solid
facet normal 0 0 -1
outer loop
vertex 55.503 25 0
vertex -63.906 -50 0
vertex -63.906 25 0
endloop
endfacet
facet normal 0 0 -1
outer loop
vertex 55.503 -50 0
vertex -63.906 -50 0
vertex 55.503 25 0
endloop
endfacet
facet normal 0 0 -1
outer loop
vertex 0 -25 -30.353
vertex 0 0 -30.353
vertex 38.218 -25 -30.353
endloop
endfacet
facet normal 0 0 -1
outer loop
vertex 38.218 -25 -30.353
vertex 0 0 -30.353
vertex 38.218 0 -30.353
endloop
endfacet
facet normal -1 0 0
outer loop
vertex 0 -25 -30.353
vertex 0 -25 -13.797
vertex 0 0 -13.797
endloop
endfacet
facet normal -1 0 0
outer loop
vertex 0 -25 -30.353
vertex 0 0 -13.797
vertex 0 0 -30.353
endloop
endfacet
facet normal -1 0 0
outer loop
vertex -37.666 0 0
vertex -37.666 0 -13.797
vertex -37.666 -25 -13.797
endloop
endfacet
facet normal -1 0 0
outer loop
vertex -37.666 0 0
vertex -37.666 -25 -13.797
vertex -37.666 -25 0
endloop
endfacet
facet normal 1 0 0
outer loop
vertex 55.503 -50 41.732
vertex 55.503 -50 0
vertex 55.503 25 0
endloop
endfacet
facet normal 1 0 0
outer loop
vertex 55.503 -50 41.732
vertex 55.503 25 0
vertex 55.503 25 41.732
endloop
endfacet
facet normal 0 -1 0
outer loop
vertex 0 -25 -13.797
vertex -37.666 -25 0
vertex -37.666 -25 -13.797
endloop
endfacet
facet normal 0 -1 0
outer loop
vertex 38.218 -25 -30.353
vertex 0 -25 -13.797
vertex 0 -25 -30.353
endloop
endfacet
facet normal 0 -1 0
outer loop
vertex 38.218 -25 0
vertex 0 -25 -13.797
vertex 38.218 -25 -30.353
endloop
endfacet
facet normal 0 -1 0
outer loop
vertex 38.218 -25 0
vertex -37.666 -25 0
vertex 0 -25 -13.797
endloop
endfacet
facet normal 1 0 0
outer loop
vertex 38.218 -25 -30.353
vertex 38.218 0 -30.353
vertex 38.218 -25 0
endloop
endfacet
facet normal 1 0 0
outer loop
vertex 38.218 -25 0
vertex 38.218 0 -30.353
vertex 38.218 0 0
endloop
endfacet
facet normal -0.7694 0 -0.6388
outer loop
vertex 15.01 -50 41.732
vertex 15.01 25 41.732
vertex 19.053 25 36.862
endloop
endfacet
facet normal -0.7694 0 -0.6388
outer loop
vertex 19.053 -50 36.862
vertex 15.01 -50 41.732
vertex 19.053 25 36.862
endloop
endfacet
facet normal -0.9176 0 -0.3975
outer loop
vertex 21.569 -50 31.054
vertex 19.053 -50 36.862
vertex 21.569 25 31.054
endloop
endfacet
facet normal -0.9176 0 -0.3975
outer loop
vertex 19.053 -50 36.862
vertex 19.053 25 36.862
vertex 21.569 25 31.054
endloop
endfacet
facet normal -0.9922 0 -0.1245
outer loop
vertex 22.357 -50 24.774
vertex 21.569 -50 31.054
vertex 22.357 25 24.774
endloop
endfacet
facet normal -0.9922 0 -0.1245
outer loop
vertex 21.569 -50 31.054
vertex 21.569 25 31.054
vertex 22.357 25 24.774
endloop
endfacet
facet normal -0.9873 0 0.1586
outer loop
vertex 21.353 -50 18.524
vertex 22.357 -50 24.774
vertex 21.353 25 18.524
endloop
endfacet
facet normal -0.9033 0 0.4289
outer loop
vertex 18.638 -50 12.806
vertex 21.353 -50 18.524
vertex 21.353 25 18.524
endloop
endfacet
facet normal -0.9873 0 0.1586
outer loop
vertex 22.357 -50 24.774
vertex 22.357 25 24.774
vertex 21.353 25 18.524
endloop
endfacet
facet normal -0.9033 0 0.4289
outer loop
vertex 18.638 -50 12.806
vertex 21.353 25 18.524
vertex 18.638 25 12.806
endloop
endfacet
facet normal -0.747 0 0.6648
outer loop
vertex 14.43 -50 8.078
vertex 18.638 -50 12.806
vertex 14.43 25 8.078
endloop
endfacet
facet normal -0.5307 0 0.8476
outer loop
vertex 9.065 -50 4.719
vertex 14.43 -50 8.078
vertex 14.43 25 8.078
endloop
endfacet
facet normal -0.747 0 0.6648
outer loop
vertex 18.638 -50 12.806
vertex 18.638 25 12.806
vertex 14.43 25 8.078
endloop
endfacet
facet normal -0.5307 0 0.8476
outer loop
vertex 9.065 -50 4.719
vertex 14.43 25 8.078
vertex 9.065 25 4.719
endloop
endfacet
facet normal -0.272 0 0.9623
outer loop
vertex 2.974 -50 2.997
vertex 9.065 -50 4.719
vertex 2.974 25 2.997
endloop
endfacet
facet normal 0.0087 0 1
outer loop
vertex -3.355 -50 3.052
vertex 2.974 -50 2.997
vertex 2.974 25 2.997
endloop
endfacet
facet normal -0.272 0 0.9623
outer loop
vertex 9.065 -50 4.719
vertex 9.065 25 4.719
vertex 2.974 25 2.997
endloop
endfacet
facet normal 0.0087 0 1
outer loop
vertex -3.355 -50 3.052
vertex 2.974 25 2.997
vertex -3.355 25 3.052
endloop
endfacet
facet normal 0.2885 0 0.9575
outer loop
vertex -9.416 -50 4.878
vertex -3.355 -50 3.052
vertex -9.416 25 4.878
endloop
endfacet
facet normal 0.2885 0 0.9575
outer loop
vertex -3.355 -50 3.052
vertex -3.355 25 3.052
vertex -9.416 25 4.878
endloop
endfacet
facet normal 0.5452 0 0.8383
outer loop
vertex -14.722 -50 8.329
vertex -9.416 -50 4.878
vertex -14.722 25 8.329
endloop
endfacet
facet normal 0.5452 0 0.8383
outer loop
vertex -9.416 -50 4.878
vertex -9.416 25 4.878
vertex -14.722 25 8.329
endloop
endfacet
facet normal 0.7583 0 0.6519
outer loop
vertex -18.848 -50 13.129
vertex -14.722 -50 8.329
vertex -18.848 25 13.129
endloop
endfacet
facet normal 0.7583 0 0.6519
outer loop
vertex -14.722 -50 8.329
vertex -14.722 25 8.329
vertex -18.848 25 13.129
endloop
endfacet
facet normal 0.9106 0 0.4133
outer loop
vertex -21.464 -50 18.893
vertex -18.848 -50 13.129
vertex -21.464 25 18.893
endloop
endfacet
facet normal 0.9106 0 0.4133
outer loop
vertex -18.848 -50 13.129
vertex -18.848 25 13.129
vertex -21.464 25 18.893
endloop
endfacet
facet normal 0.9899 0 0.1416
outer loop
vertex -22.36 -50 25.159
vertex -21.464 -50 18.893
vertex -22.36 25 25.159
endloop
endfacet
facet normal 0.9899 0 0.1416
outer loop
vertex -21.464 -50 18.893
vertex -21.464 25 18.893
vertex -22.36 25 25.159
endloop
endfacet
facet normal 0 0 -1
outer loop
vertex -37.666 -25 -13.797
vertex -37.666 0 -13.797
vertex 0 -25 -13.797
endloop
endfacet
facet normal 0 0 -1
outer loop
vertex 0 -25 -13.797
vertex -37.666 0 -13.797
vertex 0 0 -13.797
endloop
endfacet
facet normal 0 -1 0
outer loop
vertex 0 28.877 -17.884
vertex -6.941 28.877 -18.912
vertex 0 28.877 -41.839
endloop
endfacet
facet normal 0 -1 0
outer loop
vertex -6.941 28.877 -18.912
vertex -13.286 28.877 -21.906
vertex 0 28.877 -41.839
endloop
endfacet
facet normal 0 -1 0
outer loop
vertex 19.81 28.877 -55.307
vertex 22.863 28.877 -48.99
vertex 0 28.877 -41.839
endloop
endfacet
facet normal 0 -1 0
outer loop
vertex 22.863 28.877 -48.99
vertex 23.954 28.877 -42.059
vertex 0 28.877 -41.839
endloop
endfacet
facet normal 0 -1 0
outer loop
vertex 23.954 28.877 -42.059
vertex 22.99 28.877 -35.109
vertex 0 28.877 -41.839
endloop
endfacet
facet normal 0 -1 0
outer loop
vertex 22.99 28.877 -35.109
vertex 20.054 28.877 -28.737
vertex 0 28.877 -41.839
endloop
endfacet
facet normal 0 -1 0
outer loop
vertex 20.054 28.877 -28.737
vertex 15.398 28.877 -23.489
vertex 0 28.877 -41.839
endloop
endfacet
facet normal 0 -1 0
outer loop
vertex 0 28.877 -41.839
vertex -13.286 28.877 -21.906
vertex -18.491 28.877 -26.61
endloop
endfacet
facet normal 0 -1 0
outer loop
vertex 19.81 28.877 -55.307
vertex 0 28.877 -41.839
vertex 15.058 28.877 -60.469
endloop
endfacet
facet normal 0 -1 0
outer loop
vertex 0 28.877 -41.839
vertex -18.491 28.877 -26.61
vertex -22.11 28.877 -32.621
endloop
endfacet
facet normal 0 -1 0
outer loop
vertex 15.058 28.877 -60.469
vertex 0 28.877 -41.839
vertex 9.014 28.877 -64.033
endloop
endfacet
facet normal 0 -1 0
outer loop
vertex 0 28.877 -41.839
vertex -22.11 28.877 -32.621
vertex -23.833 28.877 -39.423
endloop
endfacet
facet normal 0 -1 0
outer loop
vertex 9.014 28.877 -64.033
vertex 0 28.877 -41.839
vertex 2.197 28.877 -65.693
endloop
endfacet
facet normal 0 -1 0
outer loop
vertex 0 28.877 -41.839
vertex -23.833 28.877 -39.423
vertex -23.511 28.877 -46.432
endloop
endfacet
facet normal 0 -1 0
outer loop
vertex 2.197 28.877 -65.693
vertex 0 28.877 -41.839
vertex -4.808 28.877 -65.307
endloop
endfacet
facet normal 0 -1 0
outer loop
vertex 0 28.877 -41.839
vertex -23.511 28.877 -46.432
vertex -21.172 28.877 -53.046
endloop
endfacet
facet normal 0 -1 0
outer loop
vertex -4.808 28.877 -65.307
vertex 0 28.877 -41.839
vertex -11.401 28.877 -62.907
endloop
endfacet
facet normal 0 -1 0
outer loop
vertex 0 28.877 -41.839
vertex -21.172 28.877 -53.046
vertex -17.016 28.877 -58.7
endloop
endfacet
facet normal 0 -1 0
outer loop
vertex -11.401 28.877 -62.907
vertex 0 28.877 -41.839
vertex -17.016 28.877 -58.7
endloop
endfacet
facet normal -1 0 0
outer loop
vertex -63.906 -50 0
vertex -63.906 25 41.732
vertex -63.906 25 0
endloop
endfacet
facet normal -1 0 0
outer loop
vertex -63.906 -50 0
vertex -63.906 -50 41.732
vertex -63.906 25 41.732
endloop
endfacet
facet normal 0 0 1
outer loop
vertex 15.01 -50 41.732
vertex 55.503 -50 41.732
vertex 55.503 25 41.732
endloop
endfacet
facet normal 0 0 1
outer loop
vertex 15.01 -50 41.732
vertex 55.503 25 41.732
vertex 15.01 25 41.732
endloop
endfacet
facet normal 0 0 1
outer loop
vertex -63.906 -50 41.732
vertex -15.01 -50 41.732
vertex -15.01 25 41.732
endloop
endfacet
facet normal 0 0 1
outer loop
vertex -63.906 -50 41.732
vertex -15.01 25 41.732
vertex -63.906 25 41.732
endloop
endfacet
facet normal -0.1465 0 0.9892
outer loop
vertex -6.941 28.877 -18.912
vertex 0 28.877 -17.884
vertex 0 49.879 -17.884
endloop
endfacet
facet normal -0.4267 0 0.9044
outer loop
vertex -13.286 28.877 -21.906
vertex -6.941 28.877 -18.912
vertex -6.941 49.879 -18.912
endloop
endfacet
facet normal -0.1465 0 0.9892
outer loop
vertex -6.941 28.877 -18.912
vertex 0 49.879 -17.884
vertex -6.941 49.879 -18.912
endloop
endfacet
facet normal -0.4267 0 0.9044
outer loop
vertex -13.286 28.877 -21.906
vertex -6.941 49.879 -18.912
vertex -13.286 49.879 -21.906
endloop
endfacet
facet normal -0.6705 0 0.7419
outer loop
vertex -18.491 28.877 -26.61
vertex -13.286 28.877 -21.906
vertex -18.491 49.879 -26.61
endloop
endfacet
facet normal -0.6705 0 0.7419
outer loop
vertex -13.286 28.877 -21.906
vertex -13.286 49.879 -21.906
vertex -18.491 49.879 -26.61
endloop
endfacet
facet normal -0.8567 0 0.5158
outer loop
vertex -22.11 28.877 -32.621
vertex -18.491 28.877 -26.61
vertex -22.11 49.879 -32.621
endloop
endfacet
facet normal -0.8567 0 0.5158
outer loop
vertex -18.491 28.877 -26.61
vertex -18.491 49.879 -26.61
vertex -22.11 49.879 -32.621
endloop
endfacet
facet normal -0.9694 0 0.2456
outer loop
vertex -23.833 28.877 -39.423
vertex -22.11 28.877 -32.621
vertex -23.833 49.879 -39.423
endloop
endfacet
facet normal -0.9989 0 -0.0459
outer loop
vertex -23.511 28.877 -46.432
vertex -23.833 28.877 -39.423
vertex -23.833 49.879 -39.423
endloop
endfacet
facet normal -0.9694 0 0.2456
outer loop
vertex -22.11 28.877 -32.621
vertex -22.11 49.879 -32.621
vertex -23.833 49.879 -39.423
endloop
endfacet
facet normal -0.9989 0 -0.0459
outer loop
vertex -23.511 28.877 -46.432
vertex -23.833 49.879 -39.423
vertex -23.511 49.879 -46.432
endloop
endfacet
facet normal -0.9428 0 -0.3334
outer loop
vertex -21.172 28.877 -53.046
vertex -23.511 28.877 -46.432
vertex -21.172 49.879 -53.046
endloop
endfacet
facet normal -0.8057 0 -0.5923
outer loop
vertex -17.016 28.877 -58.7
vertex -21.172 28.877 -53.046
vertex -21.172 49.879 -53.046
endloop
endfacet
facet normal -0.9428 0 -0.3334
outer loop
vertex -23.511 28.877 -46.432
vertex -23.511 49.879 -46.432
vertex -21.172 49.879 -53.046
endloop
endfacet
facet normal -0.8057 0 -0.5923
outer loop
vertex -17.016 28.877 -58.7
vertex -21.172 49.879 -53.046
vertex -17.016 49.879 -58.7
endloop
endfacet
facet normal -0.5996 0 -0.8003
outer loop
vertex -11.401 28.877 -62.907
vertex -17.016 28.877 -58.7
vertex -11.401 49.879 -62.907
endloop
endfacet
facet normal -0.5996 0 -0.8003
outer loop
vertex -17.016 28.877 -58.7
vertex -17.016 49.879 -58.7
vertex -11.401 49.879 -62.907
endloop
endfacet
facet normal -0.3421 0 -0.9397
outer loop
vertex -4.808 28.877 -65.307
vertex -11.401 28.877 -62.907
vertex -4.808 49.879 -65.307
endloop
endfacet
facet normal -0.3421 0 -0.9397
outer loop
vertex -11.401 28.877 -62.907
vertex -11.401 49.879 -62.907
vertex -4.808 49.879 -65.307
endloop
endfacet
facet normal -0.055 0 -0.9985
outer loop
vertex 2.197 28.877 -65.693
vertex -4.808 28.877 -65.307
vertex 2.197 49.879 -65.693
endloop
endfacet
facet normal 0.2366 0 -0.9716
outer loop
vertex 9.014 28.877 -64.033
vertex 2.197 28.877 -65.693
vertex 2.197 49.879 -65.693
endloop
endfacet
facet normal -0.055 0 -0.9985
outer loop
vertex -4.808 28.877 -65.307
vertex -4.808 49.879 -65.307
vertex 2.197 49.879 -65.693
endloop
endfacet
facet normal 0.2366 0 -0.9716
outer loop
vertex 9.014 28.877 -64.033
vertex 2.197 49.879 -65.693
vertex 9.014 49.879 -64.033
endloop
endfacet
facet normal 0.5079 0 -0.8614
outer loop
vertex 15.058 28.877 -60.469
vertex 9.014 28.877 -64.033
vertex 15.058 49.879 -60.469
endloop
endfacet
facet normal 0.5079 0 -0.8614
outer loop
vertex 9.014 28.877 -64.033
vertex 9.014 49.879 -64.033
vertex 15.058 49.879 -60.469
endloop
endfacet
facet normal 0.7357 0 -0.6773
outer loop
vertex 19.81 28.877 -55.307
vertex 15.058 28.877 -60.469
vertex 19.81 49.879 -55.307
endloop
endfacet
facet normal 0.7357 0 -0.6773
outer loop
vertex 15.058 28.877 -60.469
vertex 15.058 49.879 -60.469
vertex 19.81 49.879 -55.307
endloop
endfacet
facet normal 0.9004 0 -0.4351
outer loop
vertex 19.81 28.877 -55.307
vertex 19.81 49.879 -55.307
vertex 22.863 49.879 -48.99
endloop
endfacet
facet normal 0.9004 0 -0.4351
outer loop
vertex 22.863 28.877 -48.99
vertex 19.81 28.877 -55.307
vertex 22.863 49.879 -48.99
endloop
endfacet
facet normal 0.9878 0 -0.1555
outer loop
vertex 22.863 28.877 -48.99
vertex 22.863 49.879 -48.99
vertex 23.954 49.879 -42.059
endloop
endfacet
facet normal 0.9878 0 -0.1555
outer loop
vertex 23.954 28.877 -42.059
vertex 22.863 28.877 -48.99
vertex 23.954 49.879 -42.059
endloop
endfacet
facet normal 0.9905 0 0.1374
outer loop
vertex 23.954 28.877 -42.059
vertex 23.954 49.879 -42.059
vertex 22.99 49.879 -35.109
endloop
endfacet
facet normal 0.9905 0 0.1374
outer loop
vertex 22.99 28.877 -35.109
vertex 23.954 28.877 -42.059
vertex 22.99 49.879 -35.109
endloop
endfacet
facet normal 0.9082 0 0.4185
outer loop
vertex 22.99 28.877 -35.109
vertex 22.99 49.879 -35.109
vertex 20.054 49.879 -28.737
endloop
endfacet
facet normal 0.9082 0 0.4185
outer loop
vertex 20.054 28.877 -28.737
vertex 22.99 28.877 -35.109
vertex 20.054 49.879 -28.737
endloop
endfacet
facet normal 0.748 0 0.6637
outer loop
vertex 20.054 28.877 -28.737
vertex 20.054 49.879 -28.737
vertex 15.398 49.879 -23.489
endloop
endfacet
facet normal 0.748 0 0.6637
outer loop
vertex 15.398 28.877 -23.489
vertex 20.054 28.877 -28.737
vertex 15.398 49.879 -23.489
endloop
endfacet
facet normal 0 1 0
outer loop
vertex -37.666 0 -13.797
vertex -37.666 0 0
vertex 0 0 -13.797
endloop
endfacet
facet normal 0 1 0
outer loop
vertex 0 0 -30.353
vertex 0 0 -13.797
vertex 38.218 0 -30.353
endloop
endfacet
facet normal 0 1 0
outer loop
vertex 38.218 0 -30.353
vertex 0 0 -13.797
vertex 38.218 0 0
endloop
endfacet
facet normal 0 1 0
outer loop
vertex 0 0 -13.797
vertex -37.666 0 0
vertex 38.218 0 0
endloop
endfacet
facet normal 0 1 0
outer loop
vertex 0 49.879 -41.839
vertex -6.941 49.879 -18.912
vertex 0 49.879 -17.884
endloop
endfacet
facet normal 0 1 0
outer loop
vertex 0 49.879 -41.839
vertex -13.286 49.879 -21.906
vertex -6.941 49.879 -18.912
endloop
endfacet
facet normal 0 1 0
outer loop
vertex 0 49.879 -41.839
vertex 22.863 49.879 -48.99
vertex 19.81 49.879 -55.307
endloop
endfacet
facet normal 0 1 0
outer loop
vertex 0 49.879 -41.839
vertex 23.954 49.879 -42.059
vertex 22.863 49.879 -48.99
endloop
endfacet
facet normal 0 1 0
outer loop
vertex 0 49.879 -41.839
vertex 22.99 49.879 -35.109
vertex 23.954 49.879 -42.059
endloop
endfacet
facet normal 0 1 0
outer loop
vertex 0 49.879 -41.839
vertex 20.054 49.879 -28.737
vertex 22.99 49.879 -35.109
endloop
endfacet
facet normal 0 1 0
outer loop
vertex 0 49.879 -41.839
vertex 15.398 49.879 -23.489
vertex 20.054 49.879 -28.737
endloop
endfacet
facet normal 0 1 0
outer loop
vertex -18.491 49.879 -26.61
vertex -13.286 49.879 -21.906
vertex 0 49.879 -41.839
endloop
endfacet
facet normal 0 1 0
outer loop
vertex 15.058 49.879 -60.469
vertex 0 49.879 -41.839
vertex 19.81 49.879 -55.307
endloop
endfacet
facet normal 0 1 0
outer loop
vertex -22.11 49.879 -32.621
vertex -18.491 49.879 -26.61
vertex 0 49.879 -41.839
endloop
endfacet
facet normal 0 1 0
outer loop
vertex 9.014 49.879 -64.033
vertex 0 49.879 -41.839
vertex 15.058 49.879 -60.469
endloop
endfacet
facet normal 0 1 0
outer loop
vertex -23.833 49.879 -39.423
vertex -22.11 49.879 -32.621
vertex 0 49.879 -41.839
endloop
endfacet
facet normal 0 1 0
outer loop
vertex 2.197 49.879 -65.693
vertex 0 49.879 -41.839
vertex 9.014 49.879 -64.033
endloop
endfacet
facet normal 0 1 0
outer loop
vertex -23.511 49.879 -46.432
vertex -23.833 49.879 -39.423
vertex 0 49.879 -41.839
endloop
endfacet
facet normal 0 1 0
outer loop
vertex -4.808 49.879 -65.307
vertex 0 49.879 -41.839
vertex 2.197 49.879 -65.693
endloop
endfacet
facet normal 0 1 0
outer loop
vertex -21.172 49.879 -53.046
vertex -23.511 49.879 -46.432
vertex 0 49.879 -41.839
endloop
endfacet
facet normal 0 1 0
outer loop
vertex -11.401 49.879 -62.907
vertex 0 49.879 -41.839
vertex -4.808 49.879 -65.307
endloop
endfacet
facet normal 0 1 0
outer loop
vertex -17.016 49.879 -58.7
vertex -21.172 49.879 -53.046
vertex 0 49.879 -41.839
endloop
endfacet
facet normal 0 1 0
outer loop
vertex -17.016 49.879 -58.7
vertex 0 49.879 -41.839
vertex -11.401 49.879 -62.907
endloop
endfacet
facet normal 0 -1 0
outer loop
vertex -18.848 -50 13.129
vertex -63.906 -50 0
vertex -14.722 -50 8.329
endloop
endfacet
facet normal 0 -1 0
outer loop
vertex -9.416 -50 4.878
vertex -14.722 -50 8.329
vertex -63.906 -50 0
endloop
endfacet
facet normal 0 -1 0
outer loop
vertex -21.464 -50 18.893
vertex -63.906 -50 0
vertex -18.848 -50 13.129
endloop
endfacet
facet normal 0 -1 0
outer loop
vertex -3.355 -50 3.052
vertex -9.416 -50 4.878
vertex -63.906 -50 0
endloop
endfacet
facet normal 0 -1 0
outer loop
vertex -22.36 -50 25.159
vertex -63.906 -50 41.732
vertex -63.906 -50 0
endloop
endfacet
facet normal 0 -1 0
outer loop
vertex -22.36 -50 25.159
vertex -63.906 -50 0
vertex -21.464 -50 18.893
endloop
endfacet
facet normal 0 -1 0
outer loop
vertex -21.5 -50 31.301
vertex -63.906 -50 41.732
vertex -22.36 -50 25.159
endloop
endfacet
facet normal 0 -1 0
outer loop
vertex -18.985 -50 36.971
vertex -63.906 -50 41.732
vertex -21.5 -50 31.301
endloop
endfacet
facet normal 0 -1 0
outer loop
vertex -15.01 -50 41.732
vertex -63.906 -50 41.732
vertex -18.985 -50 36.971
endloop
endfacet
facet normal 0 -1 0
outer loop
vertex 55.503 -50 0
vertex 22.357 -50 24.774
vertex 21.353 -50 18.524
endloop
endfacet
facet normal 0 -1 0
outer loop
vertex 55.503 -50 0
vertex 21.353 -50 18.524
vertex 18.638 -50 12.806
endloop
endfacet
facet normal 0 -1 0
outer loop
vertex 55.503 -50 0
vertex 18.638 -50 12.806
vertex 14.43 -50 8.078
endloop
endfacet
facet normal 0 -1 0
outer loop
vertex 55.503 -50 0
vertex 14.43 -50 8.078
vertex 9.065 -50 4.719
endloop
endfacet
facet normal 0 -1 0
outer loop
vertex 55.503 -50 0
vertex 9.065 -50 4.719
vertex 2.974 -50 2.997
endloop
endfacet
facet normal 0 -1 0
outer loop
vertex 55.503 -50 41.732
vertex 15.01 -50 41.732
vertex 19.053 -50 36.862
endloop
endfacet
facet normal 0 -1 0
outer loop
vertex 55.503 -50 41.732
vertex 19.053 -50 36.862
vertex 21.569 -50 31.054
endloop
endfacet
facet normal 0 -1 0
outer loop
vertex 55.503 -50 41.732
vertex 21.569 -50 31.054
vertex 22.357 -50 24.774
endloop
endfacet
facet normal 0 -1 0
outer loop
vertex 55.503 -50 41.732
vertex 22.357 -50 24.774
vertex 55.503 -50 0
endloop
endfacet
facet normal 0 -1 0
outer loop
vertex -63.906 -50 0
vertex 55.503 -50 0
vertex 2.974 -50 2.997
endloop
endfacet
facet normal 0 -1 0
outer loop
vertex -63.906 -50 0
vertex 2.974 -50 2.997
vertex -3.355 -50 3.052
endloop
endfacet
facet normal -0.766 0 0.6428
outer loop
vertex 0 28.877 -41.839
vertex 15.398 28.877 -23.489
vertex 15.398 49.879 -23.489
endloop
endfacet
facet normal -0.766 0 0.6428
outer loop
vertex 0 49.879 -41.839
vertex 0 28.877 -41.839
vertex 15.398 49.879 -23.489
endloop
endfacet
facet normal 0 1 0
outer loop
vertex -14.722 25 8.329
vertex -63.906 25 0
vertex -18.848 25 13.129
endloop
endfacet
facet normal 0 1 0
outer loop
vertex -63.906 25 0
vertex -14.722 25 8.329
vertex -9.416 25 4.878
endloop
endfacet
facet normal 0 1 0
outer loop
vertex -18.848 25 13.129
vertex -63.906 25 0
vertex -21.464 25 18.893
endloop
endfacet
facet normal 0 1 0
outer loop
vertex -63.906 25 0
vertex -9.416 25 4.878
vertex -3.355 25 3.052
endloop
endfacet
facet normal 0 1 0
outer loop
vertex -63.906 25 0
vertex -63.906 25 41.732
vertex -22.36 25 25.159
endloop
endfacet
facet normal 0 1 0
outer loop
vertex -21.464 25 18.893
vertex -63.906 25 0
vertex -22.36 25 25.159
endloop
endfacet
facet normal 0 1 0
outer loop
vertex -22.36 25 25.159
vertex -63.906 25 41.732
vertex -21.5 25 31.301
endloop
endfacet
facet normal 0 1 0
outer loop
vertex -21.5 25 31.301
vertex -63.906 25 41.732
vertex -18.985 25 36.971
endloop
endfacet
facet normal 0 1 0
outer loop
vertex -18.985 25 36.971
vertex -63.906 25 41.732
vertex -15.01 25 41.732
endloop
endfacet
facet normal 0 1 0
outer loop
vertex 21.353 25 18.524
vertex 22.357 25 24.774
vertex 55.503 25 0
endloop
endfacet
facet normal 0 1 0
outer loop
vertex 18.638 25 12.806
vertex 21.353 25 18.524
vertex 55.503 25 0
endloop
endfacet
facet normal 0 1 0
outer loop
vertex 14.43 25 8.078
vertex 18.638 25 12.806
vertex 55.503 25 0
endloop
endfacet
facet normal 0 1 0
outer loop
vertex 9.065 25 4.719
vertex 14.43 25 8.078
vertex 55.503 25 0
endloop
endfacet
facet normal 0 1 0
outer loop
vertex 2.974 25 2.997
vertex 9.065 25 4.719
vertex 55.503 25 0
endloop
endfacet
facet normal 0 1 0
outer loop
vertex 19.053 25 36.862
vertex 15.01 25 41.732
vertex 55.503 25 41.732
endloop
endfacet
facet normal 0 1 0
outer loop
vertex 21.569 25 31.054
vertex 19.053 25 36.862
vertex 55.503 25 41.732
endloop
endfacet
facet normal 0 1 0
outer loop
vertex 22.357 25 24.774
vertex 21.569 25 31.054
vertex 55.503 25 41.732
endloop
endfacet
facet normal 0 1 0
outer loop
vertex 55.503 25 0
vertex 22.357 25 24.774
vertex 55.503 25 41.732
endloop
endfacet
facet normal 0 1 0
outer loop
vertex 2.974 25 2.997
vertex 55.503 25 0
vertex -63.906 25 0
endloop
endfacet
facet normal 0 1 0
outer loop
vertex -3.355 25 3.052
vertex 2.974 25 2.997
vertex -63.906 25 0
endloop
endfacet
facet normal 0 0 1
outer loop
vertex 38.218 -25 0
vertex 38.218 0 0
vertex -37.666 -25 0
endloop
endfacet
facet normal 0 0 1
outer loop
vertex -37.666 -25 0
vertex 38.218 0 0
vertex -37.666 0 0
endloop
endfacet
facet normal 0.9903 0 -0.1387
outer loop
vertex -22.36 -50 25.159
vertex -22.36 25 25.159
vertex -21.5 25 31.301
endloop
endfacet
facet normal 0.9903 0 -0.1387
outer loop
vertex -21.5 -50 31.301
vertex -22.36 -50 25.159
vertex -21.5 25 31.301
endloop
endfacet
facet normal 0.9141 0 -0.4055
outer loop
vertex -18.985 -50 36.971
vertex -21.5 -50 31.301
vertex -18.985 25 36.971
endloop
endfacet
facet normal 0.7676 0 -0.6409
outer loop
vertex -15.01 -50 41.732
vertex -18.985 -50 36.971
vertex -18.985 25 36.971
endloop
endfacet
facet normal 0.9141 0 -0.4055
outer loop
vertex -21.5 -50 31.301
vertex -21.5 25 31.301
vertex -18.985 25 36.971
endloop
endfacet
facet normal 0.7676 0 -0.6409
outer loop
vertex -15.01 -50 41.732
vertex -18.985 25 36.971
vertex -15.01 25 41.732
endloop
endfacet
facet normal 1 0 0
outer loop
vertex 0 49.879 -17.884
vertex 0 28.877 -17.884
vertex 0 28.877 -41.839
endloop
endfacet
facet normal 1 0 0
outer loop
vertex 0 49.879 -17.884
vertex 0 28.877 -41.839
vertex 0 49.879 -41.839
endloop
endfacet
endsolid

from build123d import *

# Parameters (mm, degrees)
F2_DEPTH = 25
F1_W     = 37.6658551395
F1_H     = 13.7970196083
F3_DEPTH = 25
F4_DEPTH = 25
F6_DEPTH = 300
F7_W     = 21.0016183555
F7_H     = 23.9549651742
F8_ANGLE = 320


with BuildPart() as f2:
    # F0 (on Front) → F2 (new body)
    with BuildSketch(Plane.XZ):
        Polygon((-63.9058277011, 0), (0, 0), (55.5029883981, 0), (55.5029883981, 41.7323634028), (-63.9058277011, 41.7323634028), align=None)
    extrude(amount=F2_DEPTH)

    # F3 (add): a face of the model
    f3_faces = [f2.faces().sort_by_distance(p)[0] for p in [
        (-4.2014196515, -25, 20.8661817014),
    ]]
    extrude(f3_faces, amount=F3_DEPTH)

    # F4 (add): a face of the model
    f4_faces = [f2.faces().sort_by_distance(p)[0] for p in [
        (-4.2014196515, 0, 20.8661817014),
    ]]
    extrude(f4_faces, amount=F4_DEPTH)

    # F5 (on face) → F6 (cut)
    with BuildSketch(Plane(origin=(0, 25, 0), x_dir=(-1, 0, 0), z_dir=(0, 1, 0))):
        with BuildLine():
            Line((-15.0098233938, 41.7323634028), (15.0098233938, 41.7323634028))
            ThreePointArc((15.0098233938, 41.7323634028), (0, 47.5189849051), (-15.0098233938, 41.7323634028))
        make_face()
        with BuildLine():
            ThreePointArc((-15.0098233938, 41.7323634028), (-9.0651881117, 4.7186498209), (22.3601791324, 25.1588057727))
            ThreePointArc((22.3601791324, 25.1588057727), (20.4401559518, 34.2239938844), (15.0098233938, 41.7323634028))
            Line((15.0098233938, 41.7323634028), (-15.0098233938, 41.7323634028))
        make_face()
    extrude(amount=-F6_DEPTH, mode=Mode.SUBTRACT)


with BuildPart() as f2b:
    # F1 (on Front) → F2, piece 2 (new body)
    with BuildSketch(Plane.XZ):
        with Locations((-18.8329275697, -6.8985098042)):
            Rectangle(F1_W, F1_H)
        Polygon((38.217741996, 0), (0, 0), (0, -13.7970196083), (0, -30.3534418344), (38.217741996, -30.3534418344), align=None)
    extrude(amount=F2_DEPTH)


with BuildPart() as f8:
    # F7 (on Right) → F8 (revolve)
    with BuildSketch(Plane.YZ):
        with Locations((39.3780265003, -29.8616662621)):
            Rectangle(F7_W, F7_H)
    revolve(axis=Axis((0, 39.3780265003, -41.8391488492), (0, -1, 0)), revolution_arc=F8_ANGLE)


solid = Compound([f2.part, f2b.part, f8.part])
